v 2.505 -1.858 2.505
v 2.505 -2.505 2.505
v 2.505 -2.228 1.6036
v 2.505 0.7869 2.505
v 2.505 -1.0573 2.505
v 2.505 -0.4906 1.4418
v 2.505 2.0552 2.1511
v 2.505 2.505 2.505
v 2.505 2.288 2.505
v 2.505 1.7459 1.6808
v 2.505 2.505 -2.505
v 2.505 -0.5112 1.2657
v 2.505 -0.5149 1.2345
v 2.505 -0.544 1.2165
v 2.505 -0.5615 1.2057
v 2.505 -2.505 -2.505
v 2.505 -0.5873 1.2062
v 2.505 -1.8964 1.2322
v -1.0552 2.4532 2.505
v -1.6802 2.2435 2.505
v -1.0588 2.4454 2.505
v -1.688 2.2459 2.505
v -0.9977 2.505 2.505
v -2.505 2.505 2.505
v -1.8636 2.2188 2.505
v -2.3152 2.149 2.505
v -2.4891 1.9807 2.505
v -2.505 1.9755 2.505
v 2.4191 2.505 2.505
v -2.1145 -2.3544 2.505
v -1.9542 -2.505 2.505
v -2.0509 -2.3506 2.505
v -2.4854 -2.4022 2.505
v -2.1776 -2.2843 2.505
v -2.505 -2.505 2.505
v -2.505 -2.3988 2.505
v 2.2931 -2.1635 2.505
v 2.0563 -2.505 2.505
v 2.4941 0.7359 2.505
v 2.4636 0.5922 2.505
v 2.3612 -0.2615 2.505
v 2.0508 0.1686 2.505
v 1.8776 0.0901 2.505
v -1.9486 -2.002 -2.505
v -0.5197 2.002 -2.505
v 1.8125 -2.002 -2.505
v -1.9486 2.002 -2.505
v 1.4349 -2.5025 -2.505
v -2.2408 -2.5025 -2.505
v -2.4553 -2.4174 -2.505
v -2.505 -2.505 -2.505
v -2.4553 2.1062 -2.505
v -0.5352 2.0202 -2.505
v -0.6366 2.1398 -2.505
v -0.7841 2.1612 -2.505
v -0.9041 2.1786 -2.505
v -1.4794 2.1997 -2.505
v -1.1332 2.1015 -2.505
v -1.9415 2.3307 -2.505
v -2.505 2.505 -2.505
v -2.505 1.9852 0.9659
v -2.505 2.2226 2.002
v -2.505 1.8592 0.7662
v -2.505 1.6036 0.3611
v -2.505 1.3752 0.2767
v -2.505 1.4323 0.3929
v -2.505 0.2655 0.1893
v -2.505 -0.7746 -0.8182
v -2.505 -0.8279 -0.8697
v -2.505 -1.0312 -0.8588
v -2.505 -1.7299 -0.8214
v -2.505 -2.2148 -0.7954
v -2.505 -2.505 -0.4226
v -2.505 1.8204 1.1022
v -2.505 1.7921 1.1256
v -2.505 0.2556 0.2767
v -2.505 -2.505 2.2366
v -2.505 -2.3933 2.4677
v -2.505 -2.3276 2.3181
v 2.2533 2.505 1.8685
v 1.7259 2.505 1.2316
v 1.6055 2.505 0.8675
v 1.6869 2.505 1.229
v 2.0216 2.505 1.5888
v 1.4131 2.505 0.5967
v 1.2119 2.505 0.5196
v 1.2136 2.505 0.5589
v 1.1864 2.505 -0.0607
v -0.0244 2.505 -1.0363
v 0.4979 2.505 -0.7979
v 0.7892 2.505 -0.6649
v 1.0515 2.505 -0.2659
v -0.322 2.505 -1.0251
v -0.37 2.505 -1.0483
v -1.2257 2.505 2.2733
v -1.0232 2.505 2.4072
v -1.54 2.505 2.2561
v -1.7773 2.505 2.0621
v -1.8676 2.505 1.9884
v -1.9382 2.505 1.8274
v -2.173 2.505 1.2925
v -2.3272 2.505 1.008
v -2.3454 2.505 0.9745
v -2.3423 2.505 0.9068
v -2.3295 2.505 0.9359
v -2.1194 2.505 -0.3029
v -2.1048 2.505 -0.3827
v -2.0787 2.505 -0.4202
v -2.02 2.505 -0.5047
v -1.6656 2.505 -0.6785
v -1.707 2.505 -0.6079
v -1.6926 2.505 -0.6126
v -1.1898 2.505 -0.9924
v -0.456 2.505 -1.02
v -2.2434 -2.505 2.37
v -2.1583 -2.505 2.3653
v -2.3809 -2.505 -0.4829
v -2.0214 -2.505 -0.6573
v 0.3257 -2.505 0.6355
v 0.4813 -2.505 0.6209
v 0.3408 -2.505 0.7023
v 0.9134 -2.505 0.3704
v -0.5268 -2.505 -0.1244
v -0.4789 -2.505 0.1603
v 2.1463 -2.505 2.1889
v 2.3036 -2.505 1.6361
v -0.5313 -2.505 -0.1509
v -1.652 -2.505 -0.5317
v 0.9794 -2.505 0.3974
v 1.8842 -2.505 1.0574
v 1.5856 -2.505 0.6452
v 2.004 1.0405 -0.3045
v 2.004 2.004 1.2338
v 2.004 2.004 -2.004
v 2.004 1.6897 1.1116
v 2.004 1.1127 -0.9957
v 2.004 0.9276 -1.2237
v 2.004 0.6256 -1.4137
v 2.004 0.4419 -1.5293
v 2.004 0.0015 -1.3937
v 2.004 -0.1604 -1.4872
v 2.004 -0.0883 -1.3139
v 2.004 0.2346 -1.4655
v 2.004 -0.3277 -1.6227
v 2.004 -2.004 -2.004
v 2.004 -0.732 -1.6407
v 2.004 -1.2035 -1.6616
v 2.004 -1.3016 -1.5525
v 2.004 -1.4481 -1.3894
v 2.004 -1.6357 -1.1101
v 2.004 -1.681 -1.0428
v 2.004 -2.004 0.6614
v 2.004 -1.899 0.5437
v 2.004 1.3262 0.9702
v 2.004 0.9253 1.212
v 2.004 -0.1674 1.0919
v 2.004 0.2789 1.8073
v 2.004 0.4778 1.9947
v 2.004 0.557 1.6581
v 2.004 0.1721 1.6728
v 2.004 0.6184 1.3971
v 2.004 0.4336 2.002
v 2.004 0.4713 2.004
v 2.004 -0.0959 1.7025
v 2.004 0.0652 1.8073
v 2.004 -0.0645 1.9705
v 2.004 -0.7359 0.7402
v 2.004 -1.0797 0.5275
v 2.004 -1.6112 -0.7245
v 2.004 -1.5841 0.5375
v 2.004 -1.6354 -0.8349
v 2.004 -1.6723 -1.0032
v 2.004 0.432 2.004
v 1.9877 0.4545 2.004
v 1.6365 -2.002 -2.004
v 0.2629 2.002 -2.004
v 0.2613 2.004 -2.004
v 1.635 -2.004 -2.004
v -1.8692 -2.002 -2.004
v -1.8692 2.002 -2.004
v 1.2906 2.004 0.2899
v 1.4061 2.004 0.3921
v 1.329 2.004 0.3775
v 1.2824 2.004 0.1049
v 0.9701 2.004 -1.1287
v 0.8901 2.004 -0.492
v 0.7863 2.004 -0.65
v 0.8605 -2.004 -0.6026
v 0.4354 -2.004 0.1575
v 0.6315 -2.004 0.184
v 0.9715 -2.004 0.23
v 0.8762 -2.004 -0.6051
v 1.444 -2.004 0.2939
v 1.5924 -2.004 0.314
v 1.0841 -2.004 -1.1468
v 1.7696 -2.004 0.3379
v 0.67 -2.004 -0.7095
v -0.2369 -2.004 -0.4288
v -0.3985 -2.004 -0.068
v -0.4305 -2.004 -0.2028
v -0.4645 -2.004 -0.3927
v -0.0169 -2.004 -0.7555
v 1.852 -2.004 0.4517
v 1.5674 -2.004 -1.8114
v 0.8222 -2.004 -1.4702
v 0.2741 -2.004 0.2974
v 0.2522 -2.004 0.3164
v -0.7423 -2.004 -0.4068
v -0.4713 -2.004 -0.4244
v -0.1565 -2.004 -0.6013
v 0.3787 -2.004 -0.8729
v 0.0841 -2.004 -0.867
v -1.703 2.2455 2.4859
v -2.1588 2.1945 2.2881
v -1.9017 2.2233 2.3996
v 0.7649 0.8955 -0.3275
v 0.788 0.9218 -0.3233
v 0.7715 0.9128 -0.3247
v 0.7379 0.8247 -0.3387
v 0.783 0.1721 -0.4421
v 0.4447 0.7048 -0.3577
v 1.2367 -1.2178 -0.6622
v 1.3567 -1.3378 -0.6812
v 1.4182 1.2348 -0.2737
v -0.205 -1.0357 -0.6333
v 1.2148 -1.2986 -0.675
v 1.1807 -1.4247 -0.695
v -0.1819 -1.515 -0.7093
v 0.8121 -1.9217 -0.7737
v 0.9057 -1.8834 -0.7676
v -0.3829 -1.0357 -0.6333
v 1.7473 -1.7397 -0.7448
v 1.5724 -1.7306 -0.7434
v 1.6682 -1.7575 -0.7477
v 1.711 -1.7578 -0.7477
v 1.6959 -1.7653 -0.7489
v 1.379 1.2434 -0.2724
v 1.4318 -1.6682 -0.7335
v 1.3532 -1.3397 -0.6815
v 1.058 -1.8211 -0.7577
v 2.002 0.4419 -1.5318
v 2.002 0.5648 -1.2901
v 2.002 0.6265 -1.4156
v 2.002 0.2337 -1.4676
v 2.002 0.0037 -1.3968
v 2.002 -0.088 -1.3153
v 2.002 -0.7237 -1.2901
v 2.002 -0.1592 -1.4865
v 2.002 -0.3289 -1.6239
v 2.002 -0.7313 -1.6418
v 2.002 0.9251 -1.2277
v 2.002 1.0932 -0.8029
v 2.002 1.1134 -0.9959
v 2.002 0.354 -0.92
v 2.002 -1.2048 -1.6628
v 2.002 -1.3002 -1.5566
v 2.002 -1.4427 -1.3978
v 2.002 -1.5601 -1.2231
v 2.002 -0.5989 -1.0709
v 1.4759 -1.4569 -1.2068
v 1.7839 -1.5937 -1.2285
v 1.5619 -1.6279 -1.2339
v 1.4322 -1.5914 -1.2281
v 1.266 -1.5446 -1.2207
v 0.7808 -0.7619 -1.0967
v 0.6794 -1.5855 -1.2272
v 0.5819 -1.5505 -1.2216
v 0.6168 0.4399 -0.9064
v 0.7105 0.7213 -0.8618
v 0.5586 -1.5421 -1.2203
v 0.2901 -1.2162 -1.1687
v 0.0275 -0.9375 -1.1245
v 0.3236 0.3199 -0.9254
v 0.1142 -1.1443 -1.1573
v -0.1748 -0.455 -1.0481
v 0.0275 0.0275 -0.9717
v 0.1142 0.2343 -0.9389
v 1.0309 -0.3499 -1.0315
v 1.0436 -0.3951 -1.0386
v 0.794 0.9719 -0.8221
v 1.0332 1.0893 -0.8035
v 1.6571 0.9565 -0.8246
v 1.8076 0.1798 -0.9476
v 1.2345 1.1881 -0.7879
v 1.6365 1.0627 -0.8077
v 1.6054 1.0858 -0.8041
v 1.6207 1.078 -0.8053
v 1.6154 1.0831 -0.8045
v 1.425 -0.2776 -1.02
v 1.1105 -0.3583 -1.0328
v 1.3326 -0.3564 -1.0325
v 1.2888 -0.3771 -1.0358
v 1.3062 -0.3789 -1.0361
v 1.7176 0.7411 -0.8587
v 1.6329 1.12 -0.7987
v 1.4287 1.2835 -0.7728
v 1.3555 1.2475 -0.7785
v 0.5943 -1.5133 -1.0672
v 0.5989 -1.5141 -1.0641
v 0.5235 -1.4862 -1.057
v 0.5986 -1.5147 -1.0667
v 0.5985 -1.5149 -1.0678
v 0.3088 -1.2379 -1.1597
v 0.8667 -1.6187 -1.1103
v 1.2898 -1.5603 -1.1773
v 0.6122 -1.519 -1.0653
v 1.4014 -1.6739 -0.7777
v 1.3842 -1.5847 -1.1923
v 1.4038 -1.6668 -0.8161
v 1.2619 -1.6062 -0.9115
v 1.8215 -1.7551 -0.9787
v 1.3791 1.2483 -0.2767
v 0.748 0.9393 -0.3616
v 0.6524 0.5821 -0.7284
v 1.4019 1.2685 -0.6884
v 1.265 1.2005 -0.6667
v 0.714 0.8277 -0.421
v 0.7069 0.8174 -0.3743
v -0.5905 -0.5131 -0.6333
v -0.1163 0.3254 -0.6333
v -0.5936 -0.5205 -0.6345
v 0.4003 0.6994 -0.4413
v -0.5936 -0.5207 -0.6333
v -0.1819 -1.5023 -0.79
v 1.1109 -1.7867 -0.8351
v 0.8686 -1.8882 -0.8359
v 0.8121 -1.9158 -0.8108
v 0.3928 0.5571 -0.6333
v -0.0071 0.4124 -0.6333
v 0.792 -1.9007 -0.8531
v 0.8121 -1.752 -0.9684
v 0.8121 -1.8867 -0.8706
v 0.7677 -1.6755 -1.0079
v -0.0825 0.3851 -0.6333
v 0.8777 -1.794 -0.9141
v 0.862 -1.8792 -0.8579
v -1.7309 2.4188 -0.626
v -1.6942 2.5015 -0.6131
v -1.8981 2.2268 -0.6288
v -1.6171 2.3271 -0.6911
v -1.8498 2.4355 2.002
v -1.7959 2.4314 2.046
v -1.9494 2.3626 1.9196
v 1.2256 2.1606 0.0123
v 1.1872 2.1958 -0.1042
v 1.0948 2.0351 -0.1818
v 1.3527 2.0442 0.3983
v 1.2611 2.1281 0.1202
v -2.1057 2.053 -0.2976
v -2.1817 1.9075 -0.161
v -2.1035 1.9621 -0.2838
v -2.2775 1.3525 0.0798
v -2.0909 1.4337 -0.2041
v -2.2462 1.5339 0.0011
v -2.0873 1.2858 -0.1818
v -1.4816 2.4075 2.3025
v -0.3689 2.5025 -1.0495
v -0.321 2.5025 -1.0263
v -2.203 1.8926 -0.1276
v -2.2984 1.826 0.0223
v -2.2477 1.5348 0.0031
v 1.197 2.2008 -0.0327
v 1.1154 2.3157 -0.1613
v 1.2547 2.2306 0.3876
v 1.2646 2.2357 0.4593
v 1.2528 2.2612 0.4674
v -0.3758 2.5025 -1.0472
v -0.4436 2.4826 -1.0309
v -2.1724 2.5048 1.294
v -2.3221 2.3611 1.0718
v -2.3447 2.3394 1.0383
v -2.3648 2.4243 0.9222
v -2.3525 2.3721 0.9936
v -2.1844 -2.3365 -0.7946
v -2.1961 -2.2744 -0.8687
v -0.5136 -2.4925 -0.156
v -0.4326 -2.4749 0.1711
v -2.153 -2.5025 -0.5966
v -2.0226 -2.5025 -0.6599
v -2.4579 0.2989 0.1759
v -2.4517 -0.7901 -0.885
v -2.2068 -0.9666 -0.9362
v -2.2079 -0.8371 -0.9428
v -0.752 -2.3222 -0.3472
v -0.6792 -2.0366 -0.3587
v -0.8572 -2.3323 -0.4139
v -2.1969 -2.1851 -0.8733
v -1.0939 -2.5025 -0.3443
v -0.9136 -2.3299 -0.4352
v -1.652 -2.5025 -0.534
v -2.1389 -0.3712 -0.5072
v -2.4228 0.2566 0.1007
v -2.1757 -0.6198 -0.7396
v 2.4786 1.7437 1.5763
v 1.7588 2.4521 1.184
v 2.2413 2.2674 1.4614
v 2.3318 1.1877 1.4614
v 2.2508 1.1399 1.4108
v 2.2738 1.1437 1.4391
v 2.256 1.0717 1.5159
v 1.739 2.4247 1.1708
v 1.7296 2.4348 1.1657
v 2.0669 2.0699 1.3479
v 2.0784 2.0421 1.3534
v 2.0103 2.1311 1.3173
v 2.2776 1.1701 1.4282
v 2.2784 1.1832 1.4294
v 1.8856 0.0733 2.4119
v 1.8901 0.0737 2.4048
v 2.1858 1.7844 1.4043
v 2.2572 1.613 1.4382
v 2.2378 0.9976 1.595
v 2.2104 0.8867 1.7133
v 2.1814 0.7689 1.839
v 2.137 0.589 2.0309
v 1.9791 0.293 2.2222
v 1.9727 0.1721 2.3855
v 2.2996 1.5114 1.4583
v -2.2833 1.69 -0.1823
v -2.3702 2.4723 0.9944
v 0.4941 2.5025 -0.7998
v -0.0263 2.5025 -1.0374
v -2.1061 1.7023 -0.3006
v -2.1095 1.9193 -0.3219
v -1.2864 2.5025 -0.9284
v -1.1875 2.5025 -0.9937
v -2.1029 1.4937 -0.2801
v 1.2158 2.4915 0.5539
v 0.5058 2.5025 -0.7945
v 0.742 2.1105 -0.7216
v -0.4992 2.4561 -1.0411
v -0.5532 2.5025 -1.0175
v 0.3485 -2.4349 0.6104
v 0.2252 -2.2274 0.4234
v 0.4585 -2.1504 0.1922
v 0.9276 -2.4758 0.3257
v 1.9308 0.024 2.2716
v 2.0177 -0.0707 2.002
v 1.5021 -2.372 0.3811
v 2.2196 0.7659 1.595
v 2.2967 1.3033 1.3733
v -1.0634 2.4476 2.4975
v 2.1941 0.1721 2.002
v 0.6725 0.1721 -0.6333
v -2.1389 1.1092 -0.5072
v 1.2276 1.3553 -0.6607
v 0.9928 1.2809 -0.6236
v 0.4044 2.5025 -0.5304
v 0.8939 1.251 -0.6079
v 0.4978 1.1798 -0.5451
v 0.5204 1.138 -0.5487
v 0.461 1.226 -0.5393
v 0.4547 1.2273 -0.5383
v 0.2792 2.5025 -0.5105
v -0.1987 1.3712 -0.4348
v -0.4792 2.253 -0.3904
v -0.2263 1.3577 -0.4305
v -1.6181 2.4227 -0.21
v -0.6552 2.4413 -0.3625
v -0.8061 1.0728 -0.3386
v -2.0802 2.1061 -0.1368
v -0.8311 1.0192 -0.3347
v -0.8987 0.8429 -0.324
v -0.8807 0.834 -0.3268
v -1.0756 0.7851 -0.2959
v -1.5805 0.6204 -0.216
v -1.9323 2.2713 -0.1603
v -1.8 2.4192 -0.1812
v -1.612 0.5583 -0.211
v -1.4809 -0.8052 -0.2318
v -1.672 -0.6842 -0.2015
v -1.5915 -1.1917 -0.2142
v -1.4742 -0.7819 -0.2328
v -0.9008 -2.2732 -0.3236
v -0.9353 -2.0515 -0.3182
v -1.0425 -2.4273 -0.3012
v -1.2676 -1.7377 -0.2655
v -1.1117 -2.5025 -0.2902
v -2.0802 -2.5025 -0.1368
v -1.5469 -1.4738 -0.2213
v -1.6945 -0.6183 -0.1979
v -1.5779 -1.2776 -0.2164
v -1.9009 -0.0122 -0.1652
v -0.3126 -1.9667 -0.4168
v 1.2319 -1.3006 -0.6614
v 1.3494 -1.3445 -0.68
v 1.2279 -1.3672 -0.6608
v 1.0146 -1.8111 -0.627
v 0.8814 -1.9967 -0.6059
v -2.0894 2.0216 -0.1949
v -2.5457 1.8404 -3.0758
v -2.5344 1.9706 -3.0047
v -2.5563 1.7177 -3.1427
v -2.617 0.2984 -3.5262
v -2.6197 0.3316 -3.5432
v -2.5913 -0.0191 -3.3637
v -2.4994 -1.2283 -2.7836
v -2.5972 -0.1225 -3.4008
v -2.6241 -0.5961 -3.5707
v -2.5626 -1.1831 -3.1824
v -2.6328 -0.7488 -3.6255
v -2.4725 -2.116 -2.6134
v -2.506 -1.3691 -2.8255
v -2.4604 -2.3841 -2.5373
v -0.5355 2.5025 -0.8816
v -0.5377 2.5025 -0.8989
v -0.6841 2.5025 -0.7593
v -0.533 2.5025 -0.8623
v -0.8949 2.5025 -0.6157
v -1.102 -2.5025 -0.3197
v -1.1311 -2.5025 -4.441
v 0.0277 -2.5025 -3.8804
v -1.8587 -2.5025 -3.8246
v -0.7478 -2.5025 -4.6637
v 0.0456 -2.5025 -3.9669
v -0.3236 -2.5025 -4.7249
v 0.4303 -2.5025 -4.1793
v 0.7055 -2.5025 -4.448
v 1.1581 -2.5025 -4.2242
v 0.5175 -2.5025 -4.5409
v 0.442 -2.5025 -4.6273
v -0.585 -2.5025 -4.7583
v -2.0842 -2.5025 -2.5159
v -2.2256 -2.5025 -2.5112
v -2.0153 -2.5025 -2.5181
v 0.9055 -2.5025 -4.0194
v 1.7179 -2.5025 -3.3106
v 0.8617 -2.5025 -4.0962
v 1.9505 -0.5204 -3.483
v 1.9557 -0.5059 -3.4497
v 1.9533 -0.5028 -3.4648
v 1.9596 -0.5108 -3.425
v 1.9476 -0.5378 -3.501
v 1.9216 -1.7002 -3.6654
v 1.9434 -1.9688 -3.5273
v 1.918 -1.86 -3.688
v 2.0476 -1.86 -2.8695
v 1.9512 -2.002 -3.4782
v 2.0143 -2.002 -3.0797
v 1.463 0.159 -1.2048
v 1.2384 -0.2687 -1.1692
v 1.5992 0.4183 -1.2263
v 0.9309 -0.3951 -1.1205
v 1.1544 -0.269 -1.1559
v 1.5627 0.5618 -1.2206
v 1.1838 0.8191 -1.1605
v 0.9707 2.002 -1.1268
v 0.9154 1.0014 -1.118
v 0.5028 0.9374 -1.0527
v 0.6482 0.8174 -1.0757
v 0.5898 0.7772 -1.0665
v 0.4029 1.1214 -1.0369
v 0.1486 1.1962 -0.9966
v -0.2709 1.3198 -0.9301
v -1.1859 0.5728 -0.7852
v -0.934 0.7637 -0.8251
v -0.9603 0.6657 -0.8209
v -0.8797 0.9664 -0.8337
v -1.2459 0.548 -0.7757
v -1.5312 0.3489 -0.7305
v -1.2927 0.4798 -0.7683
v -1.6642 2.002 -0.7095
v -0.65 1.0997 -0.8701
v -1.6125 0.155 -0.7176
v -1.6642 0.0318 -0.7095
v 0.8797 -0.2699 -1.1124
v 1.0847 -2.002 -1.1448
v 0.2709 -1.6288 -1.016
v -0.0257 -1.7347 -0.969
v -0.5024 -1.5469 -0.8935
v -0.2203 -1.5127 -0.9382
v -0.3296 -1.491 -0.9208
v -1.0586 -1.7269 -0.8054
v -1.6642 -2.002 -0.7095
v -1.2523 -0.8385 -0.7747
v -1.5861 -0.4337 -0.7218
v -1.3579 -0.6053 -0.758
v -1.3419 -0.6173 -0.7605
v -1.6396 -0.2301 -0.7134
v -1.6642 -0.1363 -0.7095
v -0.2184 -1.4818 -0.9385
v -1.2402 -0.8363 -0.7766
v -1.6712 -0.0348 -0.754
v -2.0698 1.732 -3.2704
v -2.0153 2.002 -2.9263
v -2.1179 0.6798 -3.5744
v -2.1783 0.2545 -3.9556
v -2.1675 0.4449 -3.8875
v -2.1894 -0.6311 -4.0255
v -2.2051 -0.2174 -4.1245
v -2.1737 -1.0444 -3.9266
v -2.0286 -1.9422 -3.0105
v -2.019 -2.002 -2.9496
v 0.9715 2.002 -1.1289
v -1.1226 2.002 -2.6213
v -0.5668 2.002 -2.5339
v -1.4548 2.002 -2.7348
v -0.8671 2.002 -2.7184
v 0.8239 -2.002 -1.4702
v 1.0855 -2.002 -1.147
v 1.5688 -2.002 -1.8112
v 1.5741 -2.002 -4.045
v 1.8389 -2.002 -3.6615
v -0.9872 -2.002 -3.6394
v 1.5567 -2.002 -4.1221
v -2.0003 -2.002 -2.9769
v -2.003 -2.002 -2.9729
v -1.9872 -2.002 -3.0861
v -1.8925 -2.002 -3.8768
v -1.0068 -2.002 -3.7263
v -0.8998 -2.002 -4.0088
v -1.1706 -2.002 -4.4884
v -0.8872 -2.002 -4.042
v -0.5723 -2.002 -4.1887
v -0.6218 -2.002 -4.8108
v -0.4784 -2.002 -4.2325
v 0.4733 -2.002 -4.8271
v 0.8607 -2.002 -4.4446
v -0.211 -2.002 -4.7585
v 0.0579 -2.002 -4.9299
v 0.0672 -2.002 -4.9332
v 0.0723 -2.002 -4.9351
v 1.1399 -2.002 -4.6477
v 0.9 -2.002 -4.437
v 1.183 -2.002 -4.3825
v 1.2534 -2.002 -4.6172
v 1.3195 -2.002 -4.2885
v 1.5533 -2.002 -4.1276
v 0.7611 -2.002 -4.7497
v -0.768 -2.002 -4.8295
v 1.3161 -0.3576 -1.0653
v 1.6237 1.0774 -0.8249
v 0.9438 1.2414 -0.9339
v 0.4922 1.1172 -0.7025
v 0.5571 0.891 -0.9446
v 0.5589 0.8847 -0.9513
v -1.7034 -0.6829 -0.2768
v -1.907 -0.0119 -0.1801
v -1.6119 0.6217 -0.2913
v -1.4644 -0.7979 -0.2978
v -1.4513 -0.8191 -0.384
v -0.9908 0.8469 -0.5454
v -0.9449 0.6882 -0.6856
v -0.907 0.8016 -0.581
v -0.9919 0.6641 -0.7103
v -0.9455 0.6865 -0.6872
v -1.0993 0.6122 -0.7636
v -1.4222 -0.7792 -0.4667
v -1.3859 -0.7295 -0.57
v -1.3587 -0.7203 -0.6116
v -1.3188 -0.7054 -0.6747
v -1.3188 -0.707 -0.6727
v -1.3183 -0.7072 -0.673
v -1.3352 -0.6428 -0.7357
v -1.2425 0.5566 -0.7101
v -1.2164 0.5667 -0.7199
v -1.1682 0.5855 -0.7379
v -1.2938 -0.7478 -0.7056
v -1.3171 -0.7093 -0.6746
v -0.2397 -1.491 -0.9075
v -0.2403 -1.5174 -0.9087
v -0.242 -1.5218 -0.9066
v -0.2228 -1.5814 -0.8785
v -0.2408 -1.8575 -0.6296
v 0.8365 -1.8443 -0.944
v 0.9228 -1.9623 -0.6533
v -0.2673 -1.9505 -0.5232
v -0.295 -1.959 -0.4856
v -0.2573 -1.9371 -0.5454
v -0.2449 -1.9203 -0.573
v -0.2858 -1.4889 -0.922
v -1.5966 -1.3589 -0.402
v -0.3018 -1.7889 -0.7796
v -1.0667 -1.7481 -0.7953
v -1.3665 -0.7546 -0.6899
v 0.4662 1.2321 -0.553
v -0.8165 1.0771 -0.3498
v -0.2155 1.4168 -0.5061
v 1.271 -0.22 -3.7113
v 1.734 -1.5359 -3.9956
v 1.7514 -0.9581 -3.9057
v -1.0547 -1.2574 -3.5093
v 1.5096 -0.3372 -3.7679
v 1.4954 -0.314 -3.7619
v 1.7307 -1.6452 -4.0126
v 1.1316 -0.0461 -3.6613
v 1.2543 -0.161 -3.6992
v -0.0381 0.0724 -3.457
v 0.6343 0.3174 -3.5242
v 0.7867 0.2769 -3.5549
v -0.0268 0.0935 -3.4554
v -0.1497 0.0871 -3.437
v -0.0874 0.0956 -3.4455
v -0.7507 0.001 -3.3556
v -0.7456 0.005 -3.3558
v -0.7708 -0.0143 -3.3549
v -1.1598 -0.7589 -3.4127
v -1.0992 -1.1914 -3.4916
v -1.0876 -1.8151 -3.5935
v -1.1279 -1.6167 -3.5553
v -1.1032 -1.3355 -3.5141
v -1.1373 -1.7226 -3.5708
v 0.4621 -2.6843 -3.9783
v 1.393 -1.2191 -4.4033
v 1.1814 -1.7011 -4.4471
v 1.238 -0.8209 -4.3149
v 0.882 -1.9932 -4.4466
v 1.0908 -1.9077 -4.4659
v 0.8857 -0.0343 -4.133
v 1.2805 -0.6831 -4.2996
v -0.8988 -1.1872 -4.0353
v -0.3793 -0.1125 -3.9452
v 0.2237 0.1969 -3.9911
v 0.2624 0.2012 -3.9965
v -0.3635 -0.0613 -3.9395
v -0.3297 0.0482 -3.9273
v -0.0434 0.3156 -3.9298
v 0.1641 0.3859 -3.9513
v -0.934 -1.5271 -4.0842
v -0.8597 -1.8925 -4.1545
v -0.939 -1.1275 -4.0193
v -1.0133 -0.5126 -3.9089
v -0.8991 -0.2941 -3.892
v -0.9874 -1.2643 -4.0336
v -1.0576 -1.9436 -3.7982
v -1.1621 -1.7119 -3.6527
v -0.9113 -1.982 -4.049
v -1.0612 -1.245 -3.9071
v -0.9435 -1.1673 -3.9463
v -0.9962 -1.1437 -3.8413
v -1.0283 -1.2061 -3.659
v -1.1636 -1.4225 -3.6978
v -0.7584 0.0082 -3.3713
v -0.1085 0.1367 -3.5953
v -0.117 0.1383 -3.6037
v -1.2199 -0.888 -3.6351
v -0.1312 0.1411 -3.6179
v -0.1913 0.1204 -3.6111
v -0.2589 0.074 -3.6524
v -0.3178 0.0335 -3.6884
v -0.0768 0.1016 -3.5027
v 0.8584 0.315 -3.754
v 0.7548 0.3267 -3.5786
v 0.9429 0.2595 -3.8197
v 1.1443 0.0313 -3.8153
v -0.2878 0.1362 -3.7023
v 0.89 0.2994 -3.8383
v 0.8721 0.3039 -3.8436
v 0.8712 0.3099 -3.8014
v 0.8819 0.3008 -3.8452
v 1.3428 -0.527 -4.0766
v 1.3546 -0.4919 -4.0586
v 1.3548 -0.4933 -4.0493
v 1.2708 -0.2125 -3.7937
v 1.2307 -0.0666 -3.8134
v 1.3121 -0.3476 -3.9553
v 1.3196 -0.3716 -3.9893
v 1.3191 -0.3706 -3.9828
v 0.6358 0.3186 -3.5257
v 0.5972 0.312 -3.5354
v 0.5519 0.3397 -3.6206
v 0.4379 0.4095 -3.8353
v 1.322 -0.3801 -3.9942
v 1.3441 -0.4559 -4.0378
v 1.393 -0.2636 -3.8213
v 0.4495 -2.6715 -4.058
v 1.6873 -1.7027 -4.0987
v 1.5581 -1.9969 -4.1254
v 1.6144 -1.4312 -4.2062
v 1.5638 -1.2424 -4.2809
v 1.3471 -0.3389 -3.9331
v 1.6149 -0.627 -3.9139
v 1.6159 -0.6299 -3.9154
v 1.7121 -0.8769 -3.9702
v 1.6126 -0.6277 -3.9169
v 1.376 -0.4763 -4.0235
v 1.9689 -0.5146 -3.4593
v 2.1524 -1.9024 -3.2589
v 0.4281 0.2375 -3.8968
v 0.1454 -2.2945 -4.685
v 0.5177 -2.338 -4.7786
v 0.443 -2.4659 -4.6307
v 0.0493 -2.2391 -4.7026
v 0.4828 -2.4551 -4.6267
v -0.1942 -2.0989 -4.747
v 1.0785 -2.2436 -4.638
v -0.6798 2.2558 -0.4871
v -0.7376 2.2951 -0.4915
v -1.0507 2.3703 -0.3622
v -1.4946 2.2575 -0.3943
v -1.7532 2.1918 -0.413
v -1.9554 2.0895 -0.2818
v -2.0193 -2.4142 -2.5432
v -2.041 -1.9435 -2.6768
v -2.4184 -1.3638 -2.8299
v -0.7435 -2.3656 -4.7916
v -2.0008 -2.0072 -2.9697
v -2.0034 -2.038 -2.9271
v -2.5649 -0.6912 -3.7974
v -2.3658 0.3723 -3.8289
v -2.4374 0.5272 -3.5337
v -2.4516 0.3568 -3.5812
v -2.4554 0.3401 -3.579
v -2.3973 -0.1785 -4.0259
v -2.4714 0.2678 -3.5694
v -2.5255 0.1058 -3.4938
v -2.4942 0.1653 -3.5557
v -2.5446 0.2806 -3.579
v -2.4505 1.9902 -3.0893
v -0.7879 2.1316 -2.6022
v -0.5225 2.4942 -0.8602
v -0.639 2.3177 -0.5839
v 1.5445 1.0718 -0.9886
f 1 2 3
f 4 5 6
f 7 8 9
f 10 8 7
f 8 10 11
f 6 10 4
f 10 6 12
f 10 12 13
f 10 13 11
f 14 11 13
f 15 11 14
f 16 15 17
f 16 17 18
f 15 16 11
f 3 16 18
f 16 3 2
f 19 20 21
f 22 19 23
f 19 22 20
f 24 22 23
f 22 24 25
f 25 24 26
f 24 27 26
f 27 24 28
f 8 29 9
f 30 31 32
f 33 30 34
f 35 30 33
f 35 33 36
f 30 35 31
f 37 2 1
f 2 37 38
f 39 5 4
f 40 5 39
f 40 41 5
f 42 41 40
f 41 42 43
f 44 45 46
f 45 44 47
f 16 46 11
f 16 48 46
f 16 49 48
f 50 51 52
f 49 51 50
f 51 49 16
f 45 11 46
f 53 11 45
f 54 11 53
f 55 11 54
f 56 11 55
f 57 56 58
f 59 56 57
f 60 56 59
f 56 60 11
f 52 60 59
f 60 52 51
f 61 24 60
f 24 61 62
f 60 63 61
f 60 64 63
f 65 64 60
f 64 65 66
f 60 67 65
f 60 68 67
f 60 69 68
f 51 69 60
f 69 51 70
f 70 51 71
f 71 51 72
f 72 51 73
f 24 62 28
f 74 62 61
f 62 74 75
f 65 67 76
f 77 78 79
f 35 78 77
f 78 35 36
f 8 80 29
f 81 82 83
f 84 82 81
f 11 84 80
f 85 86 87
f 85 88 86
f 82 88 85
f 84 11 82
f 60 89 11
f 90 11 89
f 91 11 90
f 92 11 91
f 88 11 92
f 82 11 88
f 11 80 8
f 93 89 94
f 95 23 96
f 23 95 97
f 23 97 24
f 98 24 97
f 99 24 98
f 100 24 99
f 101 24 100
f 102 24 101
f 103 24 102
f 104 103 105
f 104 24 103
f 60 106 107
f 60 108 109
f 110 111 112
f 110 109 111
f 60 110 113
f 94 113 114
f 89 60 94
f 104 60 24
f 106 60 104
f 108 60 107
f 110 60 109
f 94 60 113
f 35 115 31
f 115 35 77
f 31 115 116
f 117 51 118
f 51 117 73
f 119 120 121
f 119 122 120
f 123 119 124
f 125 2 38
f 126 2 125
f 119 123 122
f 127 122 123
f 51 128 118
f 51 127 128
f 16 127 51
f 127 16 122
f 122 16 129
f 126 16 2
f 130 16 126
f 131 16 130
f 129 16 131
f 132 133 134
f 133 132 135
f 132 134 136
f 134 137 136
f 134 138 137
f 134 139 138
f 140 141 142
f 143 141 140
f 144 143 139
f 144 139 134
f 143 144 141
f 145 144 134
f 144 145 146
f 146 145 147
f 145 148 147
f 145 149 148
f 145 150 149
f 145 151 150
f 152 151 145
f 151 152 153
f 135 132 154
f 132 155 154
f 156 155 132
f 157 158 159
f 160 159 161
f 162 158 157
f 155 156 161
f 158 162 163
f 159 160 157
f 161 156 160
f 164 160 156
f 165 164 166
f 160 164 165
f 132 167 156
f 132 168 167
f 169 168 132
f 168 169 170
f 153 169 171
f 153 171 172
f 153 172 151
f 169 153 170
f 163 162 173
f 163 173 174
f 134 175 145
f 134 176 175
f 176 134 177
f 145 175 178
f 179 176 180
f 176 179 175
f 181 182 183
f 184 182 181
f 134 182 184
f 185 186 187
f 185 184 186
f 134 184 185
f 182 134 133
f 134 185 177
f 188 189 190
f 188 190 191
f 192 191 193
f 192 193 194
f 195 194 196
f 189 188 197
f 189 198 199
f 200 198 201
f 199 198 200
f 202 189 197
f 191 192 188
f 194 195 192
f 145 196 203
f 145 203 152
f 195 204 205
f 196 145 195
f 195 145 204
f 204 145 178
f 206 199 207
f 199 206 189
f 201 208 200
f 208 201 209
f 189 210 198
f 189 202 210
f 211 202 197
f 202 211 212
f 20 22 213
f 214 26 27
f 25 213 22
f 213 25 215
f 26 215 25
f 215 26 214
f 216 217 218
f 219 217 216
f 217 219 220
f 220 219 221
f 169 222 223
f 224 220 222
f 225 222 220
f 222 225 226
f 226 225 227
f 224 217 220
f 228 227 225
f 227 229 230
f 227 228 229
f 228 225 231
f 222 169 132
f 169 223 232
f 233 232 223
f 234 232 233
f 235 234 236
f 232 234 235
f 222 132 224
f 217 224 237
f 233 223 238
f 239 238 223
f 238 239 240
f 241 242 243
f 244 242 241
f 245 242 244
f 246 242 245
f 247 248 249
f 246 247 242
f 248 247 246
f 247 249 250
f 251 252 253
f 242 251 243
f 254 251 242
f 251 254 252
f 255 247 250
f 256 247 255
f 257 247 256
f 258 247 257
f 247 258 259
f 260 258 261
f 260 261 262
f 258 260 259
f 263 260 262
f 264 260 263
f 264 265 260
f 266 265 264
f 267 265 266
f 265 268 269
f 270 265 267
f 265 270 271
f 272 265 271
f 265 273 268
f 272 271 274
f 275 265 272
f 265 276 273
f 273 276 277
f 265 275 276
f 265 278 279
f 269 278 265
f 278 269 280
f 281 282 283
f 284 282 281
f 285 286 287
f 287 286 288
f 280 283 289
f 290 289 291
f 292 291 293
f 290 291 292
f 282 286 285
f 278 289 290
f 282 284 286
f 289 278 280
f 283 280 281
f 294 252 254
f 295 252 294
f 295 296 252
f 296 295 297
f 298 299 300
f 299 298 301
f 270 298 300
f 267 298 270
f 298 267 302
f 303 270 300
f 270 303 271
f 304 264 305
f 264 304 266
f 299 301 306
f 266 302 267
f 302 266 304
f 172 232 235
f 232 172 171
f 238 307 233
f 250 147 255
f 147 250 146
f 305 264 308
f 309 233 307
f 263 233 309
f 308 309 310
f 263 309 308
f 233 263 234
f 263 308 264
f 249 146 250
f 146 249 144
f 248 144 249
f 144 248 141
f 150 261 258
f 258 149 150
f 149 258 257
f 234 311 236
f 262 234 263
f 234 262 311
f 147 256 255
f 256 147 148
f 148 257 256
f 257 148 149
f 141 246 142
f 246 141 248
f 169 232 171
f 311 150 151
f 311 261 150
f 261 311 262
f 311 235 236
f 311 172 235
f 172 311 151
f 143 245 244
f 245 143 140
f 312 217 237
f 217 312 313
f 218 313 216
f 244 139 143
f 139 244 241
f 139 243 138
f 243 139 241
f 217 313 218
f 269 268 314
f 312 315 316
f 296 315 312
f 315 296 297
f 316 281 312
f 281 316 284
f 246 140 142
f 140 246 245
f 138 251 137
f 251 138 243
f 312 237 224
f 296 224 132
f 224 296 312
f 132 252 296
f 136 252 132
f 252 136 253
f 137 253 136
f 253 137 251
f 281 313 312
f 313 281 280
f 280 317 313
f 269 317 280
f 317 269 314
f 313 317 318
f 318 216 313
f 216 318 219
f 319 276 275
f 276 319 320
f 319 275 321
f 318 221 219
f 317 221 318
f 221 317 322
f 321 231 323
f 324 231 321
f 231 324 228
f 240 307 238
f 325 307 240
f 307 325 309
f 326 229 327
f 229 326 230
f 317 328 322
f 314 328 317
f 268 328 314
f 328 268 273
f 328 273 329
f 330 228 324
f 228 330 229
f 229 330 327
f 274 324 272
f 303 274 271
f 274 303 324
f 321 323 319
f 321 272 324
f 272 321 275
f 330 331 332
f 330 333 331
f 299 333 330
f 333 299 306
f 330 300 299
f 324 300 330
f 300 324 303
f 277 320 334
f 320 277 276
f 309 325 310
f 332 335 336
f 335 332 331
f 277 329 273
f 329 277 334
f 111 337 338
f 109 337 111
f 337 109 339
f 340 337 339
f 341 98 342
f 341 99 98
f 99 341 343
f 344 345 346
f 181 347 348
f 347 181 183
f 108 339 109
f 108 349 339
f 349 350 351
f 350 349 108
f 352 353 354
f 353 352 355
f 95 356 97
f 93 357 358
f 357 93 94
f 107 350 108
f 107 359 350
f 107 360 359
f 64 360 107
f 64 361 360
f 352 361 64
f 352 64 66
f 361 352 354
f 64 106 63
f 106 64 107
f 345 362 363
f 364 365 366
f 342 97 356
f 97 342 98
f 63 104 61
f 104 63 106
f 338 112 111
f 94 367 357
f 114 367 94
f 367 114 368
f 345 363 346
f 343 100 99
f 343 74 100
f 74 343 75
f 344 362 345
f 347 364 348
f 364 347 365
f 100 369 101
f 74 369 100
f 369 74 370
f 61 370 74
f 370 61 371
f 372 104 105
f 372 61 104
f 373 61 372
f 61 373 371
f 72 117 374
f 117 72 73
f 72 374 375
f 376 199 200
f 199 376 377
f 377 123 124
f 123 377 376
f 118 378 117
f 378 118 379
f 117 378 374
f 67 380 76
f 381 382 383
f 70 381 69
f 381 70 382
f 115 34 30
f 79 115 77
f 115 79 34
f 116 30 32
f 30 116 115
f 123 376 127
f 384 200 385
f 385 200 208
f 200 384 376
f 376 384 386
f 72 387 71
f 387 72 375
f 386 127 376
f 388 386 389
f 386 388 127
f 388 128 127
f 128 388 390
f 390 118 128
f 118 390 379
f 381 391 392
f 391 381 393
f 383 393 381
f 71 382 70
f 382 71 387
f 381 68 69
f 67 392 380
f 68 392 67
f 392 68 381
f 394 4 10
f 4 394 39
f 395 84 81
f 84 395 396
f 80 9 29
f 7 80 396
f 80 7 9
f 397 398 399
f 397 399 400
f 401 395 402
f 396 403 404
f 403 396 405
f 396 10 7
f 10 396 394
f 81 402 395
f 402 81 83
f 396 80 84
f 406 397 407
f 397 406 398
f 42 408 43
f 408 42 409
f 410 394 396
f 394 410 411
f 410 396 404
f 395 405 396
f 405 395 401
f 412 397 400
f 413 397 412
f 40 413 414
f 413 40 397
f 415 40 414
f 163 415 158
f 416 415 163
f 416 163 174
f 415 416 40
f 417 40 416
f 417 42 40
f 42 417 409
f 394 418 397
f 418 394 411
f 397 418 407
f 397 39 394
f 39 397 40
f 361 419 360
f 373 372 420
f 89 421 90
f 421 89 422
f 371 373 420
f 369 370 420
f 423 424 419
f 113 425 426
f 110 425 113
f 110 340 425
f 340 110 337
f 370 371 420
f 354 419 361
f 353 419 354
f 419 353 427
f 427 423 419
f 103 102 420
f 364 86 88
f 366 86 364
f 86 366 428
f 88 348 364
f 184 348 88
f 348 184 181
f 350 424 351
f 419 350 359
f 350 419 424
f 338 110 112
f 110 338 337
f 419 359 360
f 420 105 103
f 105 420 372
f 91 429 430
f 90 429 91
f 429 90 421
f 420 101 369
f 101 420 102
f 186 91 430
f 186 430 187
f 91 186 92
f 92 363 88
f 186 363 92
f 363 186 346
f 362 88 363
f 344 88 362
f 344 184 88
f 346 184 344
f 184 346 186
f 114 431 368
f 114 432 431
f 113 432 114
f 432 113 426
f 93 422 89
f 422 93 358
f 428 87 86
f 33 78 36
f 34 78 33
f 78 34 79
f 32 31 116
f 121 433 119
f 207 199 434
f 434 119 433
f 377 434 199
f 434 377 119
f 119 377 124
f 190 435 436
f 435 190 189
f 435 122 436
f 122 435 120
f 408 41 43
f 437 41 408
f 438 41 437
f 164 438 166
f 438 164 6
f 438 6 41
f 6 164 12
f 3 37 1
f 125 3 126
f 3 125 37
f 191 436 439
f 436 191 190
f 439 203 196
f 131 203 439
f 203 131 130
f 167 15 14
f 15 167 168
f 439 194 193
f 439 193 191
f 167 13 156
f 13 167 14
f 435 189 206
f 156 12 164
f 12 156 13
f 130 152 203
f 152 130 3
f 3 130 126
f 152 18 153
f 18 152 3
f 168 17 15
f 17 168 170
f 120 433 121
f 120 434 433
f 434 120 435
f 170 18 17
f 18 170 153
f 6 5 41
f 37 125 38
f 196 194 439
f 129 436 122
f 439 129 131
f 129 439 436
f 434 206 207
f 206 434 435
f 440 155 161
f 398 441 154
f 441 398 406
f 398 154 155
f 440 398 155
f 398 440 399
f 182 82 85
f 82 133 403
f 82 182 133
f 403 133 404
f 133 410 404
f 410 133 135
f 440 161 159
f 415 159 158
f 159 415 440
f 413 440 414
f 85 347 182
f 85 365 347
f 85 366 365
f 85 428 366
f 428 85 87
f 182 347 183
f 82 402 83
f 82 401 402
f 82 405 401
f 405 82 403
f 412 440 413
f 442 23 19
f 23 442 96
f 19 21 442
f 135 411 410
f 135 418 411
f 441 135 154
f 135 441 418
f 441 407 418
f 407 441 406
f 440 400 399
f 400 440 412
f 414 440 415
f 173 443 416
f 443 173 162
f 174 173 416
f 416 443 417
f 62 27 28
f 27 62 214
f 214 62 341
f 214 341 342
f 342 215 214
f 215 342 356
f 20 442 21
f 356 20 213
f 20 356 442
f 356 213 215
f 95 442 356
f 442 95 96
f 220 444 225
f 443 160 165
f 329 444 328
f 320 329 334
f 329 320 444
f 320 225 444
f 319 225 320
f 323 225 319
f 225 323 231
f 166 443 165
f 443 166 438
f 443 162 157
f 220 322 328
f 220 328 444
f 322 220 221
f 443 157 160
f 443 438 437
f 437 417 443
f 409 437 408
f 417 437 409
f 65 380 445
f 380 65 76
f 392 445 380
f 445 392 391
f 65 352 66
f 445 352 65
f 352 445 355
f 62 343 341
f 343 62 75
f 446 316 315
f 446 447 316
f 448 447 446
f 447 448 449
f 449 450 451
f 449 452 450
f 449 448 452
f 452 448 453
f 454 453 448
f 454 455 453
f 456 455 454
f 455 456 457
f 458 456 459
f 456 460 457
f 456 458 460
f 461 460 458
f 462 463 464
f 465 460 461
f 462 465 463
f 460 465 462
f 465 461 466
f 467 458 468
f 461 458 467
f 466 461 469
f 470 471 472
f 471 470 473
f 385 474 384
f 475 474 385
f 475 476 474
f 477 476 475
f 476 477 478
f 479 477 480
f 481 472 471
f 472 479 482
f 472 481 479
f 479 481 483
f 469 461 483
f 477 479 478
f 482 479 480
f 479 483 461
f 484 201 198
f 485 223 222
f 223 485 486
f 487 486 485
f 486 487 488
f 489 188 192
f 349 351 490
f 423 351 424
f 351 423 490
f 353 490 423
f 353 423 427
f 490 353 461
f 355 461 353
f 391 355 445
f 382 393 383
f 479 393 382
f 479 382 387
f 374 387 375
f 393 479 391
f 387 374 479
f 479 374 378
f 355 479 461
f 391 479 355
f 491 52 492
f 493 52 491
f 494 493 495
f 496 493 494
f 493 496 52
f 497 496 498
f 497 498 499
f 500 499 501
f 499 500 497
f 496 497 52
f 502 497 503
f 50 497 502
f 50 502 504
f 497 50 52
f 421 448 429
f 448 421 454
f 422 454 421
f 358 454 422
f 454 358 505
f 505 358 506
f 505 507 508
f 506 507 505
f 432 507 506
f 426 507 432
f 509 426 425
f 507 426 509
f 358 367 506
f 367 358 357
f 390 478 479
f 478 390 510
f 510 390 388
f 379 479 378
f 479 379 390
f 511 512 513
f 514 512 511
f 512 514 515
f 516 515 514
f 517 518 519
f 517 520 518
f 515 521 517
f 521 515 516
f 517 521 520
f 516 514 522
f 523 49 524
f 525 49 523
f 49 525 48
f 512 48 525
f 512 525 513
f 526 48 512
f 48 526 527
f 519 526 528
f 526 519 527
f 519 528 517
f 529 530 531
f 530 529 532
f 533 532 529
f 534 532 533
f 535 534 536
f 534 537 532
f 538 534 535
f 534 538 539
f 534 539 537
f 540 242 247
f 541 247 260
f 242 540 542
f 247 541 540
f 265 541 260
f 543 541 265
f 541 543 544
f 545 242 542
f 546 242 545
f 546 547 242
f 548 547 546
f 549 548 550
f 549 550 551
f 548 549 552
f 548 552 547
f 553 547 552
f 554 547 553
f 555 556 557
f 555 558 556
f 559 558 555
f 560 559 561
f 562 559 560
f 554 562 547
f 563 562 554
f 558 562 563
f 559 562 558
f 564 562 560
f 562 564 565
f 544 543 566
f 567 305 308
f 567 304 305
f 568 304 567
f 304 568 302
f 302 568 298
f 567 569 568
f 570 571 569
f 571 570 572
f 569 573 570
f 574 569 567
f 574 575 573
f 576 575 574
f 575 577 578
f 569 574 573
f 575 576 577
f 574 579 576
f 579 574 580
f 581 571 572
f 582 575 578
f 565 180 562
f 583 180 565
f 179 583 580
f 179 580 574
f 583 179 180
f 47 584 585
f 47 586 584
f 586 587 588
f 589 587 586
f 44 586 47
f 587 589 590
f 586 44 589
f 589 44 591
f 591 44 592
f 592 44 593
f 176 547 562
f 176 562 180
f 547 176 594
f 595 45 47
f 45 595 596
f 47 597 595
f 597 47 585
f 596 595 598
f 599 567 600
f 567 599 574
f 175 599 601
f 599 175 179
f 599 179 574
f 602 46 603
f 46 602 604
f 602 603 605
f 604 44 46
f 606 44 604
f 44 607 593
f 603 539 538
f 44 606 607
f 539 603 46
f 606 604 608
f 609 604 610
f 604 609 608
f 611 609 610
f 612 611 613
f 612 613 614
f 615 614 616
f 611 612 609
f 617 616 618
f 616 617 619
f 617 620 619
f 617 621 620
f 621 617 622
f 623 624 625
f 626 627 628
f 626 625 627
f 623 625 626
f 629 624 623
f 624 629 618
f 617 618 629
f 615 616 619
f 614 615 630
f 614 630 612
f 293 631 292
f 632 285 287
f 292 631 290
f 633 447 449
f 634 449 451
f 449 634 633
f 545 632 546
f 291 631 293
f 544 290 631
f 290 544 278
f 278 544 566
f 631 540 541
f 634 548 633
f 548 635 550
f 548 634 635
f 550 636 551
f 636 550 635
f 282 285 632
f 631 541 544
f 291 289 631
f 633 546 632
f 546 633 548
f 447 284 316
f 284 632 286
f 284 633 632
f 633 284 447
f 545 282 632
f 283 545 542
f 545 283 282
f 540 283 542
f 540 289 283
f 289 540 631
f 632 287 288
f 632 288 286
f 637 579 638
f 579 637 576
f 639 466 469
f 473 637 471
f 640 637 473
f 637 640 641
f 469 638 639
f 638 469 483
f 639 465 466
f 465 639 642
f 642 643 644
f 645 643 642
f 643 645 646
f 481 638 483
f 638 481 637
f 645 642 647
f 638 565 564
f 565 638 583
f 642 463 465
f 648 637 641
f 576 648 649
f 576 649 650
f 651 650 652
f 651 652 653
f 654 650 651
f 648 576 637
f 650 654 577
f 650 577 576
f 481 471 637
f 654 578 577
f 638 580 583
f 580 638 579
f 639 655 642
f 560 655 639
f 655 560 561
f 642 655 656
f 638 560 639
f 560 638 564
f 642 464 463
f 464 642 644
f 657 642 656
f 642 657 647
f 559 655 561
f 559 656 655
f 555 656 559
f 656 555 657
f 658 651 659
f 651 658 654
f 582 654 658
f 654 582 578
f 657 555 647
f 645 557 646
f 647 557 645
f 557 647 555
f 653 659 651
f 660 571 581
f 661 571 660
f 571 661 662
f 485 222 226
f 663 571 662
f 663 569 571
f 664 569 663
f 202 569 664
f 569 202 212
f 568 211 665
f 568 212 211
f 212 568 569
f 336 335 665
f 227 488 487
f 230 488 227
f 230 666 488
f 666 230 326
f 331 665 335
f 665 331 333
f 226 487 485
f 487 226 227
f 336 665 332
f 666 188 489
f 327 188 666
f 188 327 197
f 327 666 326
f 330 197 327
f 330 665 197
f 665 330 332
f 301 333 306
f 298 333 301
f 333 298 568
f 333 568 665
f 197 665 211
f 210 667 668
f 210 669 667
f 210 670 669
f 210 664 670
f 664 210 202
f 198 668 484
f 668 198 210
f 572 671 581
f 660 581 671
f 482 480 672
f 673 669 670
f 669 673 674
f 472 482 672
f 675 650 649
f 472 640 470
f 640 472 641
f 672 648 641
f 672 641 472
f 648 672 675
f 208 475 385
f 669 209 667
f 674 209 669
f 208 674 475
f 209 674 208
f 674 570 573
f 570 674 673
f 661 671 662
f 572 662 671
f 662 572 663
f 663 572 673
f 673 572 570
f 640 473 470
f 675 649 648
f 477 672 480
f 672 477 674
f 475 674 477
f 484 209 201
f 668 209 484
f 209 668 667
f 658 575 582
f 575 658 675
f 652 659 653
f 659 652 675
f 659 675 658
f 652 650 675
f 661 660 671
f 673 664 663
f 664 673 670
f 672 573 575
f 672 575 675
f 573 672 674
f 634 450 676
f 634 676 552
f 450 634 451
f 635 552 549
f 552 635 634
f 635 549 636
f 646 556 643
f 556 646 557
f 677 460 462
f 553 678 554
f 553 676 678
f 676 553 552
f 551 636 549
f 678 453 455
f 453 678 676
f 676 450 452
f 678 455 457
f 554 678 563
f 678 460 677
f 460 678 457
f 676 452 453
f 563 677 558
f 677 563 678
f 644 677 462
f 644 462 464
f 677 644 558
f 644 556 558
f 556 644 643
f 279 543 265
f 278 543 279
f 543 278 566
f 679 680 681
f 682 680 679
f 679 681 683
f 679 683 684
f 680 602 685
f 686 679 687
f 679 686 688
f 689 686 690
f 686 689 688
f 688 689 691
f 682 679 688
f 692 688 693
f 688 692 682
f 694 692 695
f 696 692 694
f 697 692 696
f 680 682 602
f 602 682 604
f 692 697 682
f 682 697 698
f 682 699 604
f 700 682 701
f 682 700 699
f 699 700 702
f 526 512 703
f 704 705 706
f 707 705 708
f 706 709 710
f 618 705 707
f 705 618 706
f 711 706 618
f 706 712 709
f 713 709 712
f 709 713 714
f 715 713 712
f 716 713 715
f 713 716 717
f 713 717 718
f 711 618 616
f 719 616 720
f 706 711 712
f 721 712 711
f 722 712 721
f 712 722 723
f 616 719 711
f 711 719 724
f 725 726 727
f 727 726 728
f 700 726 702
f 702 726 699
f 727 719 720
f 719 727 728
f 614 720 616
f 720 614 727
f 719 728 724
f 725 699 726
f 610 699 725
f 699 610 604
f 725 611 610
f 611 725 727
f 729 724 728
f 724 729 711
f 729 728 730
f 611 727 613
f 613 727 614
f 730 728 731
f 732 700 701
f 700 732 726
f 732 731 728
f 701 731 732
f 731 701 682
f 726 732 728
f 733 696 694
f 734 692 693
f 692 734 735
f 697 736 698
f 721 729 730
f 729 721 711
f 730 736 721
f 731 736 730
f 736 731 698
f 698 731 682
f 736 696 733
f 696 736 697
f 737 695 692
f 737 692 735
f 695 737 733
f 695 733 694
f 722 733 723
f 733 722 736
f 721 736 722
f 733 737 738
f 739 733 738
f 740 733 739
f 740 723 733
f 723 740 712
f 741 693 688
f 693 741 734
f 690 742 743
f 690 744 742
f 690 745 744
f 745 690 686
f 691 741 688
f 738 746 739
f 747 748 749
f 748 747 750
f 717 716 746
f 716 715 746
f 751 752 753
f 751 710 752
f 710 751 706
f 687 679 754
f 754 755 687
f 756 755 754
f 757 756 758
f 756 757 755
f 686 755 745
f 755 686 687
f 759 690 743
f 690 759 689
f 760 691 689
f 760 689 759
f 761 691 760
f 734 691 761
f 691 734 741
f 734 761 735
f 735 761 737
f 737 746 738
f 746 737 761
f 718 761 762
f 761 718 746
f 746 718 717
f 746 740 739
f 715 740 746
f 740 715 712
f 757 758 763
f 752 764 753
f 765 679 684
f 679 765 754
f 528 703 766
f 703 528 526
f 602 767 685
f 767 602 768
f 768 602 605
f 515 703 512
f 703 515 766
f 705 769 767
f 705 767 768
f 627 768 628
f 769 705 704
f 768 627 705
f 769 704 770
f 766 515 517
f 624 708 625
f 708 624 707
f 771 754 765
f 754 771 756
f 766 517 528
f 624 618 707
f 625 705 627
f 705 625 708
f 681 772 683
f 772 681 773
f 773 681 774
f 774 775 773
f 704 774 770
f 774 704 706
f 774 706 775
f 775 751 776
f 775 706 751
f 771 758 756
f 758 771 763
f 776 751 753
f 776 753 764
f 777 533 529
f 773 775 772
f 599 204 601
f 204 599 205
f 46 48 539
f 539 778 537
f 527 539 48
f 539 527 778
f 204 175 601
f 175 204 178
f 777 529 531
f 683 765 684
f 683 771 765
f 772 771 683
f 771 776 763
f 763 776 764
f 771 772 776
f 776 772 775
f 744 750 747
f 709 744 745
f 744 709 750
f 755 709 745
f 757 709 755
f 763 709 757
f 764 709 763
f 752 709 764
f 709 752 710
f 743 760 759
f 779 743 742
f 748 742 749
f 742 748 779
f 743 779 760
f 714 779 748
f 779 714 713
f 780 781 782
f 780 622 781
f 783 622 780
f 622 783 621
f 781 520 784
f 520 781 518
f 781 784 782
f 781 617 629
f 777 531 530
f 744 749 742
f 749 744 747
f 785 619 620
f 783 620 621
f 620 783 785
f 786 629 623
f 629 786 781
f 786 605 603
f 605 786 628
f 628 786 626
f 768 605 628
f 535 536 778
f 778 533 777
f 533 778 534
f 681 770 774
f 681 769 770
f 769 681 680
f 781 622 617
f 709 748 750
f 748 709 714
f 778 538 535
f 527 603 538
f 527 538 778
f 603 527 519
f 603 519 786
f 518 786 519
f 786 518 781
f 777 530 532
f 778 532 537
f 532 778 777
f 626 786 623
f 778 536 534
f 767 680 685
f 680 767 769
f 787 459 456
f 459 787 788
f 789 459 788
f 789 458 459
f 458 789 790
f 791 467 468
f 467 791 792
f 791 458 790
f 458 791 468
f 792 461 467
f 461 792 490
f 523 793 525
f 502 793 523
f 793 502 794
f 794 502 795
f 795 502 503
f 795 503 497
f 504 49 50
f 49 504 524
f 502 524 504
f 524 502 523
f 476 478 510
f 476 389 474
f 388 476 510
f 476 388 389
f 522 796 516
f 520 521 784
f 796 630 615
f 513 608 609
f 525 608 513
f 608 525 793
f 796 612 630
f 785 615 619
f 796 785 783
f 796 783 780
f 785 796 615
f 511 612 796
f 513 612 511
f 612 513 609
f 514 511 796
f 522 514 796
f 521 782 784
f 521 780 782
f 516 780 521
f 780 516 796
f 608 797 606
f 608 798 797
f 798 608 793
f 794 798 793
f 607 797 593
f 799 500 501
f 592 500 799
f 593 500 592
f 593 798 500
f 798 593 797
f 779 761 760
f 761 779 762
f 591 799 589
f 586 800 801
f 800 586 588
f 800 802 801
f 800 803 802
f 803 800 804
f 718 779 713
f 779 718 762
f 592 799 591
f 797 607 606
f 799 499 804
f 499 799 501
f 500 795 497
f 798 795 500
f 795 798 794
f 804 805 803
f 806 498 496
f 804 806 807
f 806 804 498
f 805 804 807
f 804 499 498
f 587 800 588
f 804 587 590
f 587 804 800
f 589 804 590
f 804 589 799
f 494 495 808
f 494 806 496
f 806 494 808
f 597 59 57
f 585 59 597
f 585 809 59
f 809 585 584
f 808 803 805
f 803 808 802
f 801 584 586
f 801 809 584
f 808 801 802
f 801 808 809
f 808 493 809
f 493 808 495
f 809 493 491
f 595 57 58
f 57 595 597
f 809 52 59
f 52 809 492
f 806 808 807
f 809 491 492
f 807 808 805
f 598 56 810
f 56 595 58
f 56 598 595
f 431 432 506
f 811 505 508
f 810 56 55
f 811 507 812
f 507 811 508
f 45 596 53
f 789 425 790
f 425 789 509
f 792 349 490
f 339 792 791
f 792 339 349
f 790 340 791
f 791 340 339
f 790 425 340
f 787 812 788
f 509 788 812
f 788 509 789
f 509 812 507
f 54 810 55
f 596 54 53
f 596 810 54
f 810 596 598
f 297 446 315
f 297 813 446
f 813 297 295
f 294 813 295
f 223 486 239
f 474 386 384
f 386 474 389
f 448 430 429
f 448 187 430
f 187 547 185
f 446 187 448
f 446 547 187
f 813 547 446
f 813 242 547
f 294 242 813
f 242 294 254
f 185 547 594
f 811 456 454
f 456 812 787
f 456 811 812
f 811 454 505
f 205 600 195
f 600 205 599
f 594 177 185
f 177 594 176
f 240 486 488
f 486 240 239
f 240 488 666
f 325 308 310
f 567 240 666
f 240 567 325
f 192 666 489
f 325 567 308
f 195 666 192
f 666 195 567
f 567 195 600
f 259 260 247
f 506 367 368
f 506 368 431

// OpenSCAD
module select(tr,sc,ro){
    union(){
       scale(1.001) difference(){
    children(0);
     children(1);
        }
        
       translate(tr)scale(sc)rotate(ro)   intersection(){
    children(0);
    children(1);
        }
    }
    
    }
 

 select([0,0,-3],[1,1,1],[0,9,0]) {
        select([0,0,-3],[1,1,1],[9,0,0]) {
      difference(){
          cube(5,center=true);
          cube(4,center=true);
      }    
      
    translate( [rands(-1,1,1)[0],rands(-1,1,1)[0],3  ]) union(){
        sphere(1.52,$fn=8);
         for(i=[1:10]){
             translate( [rands(-1,1,1)[0],rands(-1,1,1)[0],rands(-1,1,1)[0]]) rotate([rands(0,360,1)[0],0,rands(0,360,1)[0]])sphere(1,$fn=8);
             }
         
         
         }
     
     }    
      
   translate( [rands(-1,1,1)[0],rands(-1,1,1)[0],2  ]) scale(2) union(){
        sphere(1.52);
         for(i=[1:10]){
             translate( [rands(-1,1,1)[0],rands(-1,1,1)[0],rands(-1,1,1)[0]]) rotate([rands(0,360,1)[0],0,rands(0,360,1)[0]])sphere(1,$fn=8);
             }
         
         
         }
     
     }

    
 
